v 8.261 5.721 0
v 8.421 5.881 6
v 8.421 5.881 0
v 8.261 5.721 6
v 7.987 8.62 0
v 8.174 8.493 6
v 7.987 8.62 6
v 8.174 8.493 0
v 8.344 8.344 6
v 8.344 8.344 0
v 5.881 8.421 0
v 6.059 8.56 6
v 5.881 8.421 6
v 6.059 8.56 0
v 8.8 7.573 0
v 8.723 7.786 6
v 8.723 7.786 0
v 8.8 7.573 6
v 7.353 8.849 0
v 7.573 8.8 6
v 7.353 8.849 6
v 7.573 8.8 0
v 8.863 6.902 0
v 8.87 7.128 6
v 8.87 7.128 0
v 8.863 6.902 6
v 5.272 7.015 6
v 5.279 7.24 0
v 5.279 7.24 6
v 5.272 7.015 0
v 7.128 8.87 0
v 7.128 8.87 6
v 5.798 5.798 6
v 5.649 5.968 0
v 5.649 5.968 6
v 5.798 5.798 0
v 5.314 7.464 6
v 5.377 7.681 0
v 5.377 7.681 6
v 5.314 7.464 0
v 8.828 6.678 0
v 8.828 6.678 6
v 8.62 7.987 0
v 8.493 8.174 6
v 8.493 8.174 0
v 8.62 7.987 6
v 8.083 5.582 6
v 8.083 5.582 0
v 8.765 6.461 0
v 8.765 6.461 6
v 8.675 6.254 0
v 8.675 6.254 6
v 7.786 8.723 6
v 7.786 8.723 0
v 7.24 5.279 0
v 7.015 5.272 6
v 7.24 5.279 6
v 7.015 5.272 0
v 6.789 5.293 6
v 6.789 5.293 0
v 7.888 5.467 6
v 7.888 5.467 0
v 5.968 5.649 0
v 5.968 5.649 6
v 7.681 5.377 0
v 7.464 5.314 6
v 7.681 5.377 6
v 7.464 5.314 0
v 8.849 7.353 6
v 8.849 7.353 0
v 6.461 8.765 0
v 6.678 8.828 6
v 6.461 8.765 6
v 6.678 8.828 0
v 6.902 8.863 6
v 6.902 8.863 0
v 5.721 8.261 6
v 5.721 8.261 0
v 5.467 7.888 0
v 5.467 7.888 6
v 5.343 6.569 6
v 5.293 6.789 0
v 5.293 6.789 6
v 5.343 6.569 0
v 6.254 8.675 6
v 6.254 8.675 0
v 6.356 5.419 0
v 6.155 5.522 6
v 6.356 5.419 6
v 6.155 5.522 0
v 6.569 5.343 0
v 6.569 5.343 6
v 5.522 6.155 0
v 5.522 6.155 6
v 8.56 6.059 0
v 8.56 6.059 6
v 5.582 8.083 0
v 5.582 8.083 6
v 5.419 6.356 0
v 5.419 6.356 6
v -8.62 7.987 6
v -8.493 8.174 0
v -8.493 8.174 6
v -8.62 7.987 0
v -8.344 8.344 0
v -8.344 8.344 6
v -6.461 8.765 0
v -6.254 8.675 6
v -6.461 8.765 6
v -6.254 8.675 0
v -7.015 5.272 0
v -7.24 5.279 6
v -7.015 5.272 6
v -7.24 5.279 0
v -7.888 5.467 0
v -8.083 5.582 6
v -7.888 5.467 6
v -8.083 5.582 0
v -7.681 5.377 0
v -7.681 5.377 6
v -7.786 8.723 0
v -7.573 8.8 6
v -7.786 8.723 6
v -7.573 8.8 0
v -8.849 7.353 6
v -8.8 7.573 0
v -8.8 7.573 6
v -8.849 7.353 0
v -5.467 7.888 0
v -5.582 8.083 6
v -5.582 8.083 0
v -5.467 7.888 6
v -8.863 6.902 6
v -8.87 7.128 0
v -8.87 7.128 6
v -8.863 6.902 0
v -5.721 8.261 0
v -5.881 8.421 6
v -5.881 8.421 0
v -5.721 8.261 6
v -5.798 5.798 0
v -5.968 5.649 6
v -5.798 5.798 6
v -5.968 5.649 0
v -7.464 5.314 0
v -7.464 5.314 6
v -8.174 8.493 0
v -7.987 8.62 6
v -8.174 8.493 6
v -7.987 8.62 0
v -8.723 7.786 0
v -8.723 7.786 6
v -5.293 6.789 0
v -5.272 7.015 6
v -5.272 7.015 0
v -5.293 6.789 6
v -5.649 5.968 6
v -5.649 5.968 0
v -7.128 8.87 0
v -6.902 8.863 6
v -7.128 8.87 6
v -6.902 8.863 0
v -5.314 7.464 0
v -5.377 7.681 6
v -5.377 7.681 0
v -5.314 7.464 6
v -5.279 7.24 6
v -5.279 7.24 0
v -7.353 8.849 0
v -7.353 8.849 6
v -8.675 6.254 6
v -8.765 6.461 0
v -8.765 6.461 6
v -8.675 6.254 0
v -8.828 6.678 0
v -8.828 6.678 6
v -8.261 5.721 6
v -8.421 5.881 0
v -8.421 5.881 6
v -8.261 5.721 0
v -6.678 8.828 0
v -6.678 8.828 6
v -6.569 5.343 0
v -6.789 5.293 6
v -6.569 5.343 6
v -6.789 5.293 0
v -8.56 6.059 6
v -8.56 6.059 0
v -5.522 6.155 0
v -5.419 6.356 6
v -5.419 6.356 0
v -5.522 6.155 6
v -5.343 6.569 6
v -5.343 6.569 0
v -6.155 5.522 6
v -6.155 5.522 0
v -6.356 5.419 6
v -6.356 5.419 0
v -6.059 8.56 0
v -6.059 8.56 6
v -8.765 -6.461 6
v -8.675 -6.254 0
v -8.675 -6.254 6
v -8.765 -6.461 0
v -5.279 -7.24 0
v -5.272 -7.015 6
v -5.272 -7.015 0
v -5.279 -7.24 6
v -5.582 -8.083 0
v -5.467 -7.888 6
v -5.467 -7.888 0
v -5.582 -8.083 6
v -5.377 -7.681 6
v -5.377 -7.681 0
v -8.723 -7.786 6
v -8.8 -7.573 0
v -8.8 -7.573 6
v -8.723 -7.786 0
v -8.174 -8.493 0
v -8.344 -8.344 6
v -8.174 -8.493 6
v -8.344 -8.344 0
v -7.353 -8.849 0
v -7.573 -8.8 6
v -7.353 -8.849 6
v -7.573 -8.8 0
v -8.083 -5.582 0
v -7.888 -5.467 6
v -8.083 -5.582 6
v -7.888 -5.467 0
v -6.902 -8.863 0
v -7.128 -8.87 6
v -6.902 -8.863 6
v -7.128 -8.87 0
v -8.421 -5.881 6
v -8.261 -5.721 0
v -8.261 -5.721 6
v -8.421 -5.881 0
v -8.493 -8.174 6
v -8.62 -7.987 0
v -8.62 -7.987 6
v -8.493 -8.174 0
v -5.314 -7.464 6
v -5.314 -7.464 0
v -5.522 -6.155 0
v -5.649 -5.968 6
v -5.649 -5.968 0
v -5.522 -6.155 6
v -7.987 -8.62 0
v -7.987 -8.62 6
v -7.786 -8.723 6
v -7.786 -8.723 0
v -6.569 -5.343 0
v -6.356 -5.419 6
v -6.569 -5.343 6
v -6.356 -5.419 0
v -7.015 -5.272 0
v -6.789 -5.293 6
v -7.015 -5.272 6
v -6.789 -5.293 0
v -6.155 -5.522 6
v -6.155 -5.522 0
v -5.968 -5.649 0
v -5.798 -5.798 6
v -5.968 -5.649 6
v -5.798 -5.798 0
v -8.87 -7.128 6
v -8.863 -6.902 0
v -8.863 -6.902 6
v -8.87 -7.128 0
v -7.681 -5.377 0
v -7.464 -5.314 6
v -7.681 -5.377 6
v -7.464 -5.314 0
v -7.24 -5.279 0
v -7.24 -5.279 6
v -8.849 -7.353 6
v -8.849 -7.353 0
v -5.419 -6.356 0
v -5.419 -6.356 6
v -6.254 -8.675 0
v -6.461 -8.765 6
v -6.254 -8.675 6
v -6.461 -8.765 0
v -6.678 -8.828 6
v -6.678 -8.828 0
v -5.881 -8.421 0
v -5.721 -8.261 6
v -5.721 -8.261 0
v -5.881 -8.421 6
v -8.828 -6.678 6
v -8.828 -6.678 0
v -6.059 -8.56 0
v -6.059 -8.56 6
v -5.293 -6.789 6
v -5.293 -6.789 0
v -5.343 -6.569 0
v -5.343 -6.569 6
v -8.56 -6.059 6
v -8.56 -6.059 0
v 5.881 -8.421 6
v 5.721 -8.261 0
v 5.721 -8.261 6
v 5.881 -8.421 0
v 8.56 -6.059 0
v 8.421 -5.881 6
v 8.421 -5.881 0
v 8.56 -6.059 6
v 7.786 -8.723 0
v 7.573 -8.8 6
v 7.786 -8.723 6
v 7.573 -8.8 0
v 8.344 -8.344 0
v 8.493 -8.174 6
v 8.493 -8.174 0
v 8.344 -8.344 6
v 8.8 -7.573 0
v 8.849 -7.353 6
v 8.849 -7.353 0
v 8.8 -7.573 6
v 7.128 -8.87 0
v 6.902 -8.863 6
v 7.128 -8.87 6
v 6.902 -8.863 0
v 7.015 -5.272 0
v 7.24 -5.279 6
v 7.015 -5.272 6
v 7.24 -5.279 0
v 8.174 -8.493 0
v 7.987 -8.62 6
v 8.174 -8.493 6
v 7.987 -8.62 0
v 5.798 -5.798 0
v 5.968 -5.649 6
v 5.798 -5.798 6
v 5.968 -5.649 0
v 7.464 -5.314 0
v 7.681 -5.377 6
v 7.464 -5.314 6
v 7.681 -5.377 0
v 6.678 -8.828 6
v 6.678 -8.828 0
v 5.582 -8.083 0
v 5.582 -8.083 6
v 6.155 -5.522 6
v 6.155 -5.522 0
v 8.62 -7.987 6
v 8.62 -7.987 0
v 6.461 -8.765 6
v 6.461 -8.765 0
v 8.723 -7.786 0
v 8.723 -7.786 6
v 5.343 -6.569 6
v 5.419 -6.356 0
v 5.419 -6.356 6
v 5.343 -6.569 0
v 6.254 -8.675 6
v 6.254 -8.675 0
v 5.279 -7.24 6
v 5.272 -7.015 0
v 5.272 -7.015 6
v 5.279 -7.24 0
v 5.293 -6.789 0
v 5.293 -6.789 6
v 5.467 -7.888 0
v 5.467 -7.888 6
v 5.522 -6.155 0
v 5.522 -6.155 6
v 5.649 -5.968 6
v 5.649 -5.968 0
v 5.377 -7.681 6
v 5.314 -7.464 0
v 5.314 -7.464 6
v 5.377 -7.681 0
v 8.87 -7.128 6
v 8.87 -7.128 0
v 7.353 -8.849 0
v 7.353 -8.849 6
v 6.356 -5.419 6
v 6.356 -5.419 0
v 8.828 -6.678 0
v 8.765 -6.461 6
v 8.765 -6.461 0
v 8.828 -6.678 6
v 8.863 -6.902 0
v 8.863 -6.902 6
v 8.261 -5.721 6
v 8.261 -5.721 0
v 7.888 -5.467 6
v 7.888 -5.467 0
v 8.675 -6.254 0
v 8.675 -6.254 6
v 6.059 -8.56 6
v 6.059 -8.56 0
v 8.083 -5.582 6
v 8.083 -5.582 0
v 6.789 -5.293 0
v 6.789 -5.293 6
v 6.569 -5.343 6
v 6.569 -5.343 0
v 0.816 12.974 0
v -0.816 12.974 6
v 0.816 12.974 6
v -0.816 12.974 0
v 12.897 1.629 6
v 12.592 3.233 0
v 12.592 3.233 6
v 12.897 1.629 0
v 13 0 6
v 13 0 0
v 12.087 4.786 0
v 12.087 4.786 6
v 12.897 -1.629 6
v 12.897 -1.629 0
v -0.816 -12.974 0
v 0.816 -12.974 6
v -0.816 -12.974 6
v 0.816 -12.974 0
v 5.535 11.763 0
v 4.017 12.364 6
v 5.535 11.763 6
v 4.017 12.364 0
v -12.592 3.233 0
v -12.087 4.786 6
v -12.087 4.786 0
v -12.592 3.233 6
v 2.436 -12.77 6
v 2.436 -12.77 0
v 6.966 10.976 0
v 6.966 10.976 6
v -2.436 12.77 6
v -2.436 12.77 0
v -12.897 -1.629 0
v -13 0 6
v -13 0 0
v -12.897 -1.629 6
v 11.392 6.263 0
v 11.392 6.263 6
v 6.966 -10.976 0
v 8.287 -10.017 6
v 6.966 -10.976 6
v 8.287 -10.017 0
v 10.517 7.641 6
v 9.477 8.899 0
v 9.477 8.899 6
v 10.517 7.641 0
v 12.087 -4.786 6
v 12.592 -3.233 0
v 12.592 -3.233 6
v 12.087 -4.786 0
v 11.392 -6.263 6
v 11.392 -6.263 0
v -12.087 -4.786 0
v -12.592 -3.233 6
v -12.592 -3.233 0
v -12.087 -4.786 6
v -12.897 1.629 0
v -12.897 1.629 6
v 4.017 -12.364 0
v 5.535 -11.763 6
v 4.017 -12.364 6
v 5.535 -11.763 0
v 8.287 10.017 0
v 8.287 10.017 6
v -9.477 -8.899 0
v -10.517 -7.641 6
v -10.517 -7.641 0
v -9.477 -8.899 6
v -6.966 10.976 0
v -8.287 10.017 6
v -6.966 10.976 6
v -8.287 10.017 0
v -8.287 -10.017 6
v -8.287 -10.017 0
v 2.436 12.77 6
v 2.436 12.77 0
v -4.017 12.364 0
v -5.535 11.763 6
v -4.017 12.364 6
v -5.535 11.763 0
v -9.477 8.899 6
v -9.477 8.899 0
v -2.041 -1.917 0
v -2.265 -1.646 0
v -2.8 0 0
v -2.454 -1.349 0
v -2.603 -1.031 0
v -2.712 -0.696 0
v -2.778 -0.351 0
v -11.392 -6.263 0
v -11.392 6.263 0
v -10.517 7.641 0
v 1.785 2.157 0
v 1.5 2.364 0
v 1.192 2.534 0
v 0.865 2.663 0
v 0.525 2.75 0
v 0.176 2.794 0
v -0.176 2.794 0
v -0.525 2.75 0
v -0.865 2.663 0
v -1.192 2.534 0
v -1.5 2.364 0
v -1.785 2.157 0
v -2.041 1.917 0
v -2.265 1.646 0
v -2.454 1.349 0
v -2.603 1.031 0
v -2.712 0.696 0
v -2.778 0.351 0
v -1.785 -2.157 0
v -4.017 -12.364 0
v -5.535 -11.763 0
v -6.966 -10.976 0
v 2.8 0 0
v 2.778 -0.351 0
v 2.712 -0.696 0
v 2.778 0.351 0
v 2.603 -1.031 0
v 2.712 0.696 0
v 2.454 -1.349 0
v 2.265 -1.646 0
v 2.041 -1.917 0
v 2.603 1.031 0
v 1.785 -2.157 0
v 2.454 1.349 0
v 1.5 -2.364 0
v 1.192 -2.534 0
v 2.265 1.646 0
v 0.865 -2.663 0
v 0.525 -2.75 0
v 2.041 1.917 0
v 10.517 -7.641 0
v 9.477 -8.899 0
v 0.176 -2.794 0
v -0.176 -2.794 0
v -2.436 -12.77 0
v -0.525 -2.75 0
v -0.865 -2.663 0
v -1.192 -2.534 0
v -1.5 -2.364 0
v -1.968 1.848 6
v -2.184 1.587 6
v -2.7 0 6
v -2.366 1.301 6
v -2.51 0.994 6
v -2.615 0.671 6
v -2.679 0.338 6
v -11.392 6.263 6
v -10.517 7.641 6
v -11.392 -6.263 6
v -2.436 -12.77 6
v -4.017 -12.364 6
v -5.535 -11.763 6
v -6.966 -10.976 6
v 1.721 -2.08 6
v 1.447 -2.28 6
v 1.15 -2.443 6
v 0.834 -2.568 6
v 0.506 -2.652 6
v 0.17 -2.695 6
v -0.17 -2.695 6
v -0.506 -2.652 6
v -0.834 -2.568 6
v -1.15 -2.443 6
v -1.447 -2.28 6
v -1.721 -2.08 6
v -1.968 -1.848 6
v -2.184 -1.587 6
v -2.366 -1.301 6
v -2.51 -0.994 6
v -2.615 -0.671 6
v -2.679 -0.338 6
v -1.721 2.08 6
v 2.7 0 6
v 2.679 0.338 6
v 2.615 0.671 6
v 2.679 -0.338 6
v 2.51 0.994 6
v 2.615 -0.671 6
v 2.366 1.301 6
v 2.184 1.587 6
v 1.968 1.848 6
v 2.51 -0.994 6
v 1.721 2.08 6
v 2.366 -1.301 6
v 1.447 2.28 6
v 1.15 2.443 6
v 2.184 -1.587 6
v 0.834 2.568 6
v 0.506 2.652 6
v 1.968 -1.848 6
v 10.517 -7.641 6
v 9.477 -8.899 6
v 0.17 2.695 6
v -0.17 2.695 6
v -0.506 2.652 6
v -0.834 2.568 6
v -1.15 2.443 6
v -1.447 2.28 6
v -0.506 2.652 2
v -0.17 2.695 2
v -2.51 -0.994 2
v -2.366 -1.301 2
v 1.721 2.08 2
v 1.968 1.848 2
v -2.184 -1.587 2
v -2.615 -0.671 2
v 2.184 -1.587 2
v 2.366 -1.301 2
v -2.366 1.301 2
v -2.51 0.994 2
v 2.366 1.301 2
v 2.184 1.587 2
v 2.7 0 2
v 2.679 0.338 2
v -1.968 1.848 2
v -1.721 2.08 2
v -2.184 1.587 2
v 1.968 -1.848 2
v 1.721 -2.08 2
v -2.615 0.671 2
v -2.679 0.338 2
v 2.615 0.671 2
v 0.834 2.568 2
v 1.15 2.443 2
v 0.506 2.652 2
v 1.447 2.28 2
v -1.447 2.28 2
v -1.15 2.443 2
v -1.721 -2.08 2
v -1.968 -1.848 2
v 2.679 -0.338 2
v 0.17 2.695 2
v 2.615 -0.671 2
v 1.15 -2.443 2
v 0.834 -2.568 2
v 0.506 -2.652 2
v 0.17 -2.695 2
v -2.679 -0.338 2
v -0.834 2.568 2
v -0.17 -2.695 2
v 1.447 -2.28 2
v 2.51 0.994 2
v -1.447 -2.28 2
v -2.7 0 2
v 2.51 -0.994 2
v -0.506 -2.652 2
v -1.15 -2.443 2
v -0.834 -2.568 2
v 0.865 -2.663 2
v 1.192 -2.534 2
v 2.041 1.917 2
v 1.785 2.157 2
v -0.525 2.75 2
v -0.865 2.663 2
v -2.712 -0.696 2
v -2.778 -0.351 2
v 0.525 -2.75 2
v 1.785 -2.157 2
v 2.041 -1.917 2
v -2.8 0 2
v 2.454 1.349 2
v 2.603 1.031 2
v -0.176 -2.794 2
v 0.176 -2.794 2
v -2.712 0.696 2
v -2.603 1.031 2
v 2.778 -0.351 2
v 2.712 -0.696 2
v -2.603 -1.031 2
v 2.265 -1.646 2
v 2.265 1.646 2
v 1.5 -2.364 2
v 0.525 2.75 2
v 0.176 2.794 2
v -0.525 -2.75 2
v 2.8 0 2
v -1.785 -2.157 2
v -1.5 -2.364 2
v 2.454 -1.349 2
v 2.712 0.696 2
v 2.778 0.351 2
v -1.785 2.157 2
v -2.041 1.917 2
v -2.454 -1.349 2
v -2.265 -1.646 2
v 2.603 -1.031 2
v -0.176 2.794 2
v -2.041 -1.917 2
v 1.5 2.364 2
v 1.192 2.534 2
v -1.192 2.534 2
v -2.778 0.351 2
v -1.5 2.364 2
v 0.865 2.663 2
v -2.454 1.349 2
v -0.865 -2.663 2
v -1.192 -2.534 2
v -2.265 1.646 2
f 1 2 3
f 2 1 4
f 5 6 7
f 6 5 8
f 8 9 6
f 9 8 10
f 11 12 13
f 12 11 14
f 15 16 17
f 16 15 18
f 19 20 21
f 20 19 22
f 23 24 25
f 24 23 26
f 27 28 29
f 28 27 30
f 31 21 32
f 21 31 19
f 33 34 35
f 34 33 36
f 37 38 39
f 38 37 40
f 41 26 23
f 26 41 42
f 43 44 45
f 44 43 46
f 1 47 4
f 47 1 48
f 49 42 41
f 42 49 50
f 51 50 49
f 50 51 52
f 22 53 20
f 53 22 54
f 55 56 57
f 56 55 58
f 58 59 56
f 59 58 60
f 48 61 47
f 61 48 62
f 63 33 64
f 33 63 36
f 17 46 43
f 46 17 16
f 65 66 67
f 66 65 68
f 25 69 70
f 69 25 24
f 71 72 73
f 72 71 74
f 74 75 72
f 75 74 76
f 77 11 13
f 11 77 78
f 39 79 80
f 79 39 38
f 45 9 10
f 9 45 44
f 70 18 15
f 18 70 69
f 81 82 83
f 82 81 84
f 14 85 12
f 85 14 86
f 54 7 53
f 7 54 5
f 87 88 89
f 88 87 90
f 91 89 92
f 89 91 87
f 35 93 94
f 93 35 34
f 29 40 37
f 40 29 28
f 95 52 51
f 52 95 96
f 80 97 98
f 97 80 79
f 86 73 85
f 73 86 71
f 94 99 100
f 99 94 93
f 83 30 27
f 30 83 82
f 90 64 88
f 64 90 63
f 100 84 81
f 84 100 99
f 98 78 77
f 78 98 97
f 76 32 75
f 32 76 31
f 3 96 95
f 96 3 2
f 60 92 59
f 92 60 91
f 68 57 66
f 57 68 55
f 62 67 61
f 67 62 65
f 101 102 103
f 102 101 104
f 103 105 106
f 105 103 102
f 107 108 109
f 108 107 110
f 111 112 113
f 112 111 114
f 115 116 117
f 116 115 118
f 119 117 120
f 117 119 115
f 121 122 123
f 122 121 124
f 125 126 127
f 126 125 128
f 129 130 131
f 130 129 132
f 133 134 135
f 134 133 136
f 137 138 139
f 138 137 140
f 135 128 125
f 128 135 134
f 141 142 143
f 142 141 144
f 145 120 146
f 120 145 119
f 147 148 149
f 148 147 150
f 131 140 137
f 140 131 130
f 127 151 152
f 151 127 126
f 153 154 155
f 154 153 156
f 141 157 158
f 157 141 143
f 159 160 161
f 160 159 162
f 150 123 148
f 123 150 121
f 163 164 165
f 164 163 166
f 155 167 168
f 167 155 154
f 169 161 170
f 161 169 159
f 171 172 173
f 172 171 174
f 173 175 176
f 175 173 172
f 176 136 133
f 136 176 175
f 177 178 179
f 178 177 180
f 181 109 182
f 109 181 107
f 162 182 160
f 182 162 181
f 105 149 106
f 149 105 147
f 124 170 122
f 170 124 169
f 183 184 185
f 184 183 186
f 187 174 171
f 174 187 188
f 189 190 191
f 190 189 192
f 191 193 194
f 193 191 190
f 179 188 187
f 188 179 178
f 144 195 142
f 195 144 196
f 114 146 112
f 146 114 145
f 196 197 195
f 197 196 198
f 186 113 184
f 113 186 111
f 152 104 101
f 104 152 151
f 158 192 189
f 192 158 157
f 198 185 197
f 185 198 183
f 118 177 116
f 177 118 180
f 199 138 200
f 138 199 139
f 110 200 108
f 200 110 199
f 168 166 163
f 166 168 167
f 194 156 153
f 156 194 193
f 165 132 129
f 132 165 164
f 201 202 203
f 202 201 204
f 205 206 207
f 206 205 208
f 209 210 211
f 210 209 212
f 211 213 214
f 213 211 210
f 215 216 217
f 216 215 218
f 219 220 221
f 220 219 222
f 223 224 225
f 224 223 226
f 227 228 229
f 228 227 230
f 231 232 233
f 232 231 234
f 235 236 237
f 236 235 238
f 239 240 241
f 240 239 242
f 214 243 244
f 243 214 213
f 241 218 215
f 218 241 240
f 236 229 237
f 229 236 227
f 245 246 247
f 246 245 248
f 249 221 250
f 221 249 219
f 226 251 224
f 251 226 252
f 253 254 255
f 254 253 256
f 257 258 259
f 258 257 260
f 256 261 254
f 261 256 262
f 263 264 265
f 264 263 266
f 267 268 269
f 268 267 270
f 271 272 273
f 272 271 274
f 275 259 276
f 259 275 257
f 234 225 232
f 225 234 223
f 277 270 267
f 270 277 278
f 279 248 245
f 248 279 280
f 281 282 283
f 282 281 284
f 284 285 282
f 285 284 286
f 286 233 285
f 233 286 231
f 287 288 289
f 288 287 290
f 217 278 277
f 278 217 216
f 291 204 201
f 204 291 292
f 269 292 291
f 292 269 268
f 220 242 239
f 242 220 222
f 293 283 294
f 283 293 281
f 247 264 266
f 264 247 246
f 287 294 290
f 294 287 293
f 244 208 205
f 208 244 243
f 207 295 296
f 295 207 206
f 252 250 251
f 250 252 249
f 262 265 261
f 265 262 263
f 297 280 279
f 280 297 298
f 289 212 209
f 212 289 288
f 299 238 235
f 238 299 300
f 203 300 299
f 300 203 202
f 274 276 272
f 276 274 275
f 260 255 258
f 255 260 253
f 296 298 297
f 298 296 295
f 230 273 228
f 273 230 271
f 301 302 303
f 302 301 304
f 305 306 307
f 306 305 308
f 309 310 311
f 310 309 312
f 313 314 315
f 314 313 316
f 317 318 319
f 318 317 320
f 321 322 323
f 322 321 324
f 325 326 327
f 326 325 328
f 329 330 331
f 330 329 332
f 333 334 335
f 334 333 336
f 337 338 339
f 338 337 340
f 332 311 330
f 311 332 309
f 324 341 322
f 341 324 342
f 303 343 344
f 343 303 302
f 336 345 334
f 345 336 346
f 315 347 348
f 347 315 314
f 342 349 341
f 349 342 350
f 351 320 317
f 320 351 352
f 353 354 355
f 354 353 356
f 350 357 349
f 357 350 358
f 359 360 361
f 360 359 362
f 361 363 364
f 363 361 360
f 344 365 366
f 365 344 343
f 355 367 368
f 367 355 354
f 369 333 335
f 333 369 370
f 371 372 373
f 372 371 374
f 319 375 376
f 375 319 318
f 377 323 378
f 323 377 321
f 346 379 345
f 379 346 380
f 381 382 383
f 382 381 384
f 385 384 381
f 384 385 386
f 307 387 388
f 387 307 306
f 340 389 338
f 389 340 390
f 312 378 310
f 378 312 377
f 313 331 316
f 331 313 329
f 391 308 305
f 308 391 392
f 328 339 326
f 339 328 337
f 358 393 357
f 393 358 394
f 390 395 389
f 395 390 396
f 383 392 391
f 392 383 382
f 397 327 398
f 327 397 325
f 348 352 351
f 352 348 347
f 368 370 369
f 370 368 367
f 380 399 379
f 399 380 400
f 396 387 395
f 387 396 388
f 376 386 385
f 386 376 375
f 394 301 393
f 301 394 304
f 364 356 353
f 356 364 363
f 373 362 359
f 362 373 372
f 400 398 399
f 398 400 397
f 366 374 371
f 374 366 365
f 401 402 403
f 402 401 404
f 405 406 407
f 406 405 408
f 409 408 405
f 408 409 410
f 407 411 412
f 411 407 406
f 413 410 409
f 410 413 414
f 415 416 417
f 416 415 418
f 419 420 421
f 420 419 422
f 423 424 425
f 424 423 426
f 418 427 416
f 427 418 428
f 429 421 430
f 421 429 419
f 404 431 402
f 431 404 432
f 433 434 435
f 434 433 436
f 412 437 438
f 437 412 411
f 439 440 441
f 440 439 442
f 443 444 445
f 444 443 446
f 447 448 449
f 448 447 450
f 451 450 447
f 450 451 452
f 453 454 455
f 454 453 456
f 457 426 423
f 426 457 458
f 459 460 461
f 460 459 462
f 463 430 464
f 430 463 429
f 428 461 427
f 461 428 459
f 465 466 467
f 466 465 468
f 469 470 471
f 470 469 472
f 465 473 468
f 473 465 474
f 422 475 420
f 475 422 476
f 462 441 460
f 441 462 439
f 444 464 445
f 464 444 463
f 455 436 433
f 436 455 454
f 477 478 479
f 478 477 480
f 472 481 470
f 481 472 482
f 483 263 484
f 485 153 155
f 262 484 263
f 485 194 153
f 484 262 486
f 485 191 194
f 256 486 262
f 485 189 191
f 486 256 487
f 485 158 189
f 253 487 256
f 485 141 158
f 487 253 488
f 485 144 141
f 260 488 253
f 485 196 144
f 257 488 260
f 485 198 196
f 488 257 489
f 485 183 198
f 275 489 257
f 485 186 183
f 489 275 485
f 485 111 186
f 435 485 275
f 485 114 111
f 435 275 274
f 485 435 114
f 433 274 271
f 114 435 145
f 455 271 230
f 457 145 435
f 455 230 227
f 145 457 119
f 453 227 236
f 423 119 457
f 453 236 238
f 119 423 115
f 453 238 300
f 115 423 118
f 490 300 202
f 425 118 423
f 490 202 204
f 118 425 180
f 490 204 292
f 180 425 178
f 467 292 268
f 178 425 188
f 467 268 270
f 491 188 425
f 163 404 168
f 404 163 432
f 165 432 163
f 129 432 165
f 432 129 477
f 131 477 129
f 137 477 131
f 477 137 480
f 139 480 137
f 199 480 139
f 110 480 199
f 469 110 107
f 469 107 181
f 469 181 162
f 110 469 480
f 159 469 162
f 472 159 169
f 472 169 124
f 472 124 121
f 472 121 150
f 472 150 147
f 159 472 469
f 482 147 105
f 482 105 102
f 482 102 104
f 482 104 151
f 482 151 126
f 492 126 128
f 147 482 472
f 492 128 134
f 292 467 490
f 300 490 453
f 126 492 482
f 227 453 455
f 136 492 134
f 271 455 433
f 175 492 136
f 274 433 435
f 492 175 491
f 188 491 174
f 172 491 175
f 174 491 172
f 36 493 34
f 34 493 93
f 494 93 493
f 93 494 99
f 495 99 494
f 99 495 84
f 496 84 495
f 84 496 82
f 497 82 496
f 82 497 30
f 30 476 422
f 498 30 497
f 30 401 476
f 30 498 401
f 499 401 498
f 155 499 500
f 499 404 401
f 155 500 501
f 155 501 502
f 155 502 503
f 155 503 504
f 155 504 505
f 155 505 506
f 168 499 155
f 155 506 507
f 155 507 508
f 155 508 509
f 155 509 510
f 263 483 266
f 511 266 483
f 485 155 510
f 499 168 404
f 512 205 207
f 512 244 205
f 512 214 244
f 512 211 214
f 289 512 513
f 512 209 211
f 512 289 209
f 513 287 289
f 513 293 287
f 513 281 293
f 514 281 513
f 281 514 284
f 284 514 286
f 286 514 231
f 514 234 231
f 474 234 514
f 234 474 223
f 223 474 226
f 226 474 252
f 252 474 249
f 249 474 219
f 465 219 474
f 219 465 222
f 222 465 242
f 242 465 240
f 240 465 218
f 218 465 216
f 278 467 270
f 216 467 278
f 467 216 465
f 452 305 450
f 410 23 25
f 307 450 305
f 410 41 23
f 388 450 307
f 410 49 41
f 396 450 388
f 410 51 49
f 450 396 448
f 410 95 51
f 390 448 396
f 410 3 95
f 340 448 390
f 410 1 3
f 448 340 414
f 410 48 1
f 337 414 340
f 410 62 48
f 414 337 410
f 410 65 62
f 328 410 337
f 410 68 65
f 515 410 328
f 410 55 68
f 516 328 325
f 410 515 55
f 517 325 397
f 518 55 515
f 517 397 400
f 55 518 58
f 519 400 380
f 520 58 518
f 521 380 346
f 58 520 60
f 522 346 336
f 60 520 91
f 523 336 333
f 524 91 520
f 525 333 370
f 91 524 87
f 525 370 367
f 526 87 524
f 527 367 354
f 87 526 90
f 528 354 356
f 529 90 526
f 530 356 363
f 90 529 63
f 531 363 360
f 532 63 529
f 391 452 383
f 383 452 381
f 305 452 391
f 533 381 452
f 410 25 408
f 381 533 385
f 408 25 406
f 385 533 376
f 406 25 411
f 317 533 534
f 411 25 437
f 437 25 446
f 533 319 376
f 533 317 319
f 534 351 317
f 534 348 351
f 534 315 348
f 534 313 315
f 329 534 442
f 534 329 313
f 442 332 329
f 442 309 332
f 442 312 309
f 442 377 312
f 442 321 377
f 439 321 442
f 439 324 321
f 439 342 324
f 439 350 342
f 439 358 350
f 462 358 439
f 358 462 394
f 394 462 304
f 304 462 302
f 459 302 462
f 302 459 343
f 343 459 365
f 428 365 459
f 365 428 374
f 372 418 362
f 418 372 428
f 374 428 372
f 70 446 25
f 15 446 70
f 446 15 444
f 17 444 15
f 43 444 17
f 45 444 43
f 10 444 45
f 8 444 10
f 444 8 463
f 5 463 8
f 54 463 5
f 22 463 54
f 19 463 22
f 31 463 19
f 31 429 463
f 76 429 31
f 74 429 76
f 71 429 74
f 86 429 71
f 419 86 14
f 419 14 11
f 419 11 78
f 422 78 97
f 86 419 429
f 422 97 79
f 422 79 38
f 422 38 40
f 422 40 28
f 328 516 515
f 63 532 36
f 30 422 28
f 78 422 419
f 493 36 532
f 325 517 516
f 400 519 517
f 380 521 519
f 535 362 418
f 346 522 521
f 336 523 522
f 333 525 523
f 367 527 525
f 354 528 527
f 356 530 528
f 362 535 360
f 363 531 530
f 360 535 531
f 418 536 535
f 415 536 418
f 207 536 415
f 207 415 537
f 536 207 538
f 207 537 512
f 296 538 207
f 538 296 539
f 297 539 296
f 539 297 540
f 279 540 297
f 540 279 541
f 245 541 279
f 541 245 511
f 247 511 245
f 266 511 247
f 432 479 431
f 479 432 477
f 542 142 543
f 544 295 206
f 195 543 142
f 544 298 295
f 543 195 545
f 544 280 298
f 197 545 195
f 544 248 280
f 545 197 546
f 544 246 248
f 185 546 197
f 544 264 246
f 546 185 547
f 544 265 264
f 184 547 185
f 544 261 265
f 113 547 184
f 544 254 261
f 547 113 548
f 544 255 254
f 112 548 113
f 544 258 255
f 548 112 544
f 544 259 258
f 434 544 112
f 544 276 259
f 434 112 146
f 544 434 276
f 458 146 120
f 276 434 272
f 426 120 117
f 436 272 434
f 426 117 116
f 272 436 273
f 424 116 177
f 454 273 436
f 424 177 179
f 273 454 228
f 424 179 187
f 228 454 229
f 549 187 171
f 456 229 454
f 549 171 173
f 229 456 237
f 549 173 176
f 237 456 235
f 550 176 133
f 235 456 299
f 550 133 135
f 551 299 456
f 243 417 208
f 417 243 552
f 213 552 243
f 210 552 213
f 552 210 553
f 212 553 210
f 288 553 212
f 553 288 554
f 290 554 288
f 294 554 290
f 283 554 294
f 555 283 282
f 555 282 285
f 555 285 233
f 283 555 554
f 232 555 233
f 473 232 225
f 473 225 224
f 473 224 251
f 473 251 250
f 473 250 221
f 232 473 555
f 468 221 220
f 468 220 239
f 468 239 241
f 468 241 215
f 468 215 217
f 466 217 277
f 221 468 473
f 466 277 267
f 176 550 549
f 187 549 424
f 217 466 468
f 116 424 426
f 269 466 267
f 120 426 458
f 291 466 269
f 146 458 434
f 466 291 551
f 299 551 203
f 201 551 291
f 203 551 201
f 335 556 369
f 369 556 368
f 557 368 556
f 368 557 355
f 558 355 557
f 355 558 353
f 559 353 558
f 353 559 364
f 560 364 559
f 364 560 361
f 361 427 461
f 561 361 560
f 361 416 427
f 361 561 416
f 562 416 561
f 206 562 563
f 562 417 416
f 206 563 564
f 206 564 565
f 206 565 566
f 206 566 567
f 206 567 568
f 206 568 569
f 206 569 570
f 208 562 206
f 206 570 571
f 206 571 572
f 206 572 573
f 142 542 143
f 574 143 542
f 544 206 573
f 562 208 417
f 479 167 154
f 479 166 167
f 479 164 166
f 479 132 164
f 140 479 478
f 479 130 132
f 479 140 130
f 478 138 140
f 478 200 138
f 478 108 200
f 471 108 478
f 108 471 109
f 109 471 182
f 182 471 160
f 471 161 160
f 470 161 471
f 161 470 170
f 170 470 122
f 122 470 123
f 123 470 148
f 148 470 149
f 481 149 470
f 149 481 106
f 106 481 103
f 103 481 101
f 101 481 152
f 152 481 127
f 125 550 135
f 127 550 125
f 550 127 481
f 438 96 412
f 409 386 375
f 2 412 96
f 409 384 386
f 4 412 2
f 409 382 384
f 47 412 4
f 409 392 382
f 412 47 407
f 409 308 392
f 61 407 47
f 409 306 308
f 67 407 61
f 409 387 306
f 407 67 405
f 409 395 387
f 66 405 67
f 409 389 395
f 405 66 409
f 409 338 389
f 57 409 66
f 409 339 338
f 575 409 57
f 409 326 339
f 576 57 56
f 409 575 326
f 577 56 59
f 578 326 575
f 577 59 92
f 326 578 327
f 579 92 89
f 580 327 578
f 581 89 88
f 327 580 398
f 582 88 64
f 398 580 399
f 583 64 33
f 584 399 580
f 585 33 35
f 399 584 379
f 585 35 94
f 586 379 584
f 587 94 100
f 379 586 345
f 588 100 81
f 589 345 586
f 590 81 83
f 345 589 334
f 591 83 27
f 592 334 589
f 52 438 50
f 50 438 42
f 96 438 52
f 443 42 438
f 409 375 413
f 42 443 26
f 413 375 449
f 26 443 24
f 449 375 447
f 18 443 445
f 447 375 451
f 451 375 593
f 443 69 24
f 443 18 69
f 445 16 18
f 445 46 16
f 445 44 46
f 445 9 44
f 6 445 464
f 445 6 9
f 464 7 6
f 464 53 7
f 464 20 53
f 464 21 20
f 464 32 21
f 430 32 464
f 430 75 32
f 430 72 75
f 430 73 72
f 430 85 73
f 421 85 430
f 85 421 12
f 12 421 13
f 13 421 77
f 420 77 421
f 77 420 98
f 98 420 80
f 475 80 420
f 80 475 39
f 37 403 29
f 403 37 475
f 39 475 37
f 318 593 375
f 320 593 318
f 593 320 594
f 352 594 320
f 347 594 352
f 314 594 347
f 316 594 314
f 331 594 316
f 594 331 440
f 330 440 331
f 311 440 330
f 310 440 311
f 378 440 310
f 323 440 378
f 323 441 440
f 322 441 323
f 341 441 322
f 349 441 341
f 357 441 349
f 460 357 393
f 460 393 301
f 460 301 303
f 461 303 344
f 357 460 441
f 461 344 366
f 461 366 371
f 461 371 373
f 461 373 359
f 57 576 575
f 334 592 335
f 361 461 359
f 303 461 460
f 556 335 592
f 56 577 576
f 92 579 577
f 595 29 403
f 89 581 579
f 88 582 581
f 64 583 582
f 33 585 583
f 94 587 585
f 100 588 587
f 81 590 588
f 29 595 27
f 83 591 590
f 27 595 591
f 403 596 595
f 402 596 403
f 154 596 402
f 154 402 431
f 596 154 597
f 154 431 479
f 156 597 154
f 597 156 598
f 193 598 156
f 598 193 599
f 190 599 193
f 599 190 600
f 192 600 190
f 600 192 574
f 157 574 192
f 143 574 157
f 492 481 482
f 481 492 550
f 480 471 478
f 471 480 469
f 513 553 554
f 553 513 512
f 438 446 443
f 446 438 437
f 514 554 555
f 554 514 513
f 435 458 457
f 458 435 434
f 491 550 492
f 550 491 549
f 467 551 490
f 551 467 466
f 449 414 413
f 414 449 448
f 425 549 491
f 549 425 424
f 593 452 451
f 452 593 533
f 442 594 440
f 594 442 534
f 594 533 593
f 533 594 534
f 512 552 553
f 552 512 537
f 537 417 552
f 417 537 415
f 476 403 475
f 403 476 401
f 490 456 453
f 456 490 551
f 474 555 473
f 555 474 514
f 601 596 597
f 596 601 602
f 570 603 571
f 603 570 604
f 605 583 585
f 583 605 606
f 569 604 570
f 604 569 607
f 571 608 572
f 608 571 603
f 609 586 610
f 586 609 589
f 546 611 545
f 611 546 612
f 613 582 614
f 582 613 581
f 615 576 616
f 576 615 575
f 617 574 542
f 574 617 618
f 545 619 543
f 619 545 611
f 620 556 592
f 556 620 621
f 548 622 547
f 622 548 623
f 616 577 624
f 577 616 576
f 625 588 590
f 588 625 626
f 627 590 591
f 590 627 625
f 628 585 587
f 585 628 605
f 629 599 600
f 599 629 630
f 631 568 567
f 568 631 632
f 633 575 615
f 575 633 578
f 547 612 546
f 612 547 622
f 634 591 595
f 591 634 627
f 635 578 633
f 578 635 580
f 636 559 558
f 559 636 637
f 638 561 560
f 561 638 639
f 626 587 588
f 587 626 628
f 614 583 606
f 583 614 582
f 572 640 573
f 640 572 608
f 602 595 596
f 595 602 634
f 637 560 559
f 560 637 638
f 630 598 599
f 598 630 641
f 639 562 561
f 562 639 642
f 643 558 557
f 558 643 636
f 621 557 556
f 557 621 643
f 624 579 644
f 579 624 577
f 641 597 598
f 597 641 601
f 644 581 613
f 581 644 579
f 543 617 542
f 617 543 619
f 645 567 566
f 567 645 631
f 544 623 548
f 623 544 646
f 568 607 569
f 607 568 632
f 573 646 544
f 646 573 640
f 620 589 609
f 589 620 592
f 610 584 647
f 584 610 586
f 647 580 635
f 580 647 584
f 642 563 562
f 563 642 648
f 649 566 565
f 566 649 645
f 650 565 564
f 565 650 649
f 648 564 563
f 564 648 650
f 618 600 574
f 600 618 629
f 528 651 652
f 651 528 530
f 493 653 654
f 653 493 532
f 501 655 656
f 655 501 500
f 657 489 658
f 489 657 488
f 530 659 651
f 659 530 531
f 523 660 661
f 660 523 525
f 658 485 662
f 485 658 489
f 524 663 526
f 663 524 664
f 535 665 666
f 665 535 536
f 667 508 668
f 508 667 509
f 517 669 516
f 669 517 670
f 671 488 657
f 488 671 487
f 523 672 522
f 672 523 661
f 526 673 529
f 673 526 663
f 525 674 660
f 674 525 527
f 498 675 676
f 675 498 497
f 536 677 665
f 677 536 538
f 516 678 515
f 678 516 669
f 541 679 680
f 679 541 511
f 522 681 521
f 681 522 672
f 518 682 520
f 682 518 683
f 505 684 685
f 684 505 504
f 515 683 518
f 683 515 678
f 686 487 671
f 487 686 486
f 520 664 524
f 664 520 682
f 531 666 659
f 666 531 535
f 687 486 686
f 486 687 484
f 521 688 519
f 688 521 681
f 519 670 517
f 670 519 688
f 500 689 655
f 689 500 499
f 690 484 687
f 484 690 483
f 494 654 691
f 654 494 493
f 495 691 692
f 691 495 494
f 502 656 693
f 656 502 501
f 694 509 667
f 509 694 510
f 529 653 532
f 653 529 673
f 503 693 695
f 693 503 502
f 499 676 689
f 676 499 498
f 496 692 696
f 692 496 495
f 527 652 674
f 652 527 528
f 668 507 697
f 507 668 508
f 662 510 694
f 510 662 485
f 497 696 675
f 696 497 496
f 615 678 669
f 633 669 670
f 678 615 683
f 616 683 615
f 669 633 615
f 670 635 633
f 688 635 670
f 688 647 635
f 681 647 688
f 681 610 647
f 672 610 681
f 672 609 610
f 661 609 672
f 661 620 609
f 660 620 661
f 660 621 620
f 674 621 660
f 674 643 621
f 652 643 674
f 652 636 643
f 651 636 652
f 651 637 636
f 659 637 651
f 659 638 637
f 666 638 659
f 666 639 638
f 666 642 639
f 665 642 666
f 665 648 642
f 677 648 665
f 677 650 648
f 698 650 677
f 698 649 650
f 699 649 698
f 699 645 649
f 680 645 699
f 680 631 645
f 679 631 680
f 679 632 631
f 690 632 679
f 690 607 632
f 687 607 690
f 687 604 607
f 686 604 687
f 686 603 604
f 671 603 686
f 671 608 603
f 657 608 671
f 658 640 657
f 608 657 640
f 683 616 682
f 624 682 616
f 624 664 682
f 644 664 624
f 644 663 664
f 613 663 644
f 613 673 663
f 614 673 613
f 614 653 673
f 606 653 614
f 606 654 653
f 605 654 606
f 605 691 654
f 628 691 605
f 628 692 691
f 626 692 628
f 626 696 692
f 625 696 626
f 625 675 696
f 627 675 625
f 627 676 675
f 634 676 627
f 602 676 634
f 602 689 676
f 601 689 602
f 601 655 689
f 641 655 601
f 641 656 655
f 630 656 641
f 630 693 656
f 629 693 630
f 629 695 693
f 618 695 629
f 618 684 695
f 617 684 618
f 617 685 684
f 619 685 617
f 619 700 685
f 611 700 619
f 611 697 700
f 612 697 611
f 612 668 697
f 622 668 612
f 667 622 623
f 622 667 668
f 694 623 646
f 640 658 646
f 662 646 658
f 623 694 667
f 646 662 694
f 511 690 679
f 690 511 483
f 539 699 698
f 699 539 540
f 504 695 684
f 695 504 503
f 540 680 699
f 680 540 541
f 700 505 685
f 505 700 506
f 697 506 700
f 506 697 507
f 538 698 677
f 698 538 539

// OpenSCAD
// toutes les dimensions sont en mm
diametre=26;
epaisseur=6;
trou_diametre_large=5.6;
trou_diametre=5.4;
epaisseur_large=2;
trou_vis_diametre=3.6;
trou_vis_ecartement=10;
fn=50; // nombre de facettes


difference() {
    cylinder(d=diametre, h=epaisseur, $fn=fn);
    translate([0,  0,-1]) cylinder(d=trou_diametre, h=epaisseur+2, $fn=fn);
    translate([0,  0,-1]) cylinder(d=trou_diametre_large, h=epaisseur_large+1, $fn=fn);
    for (angle=[0:90:360])
            rotate([0,0,angle+45])
                translate([trou_vis_ecartement, 0, -1])
                    cylinder(d=trou_vis_diametre, h=epaisseur+2, $fn=fn);
     
 }
